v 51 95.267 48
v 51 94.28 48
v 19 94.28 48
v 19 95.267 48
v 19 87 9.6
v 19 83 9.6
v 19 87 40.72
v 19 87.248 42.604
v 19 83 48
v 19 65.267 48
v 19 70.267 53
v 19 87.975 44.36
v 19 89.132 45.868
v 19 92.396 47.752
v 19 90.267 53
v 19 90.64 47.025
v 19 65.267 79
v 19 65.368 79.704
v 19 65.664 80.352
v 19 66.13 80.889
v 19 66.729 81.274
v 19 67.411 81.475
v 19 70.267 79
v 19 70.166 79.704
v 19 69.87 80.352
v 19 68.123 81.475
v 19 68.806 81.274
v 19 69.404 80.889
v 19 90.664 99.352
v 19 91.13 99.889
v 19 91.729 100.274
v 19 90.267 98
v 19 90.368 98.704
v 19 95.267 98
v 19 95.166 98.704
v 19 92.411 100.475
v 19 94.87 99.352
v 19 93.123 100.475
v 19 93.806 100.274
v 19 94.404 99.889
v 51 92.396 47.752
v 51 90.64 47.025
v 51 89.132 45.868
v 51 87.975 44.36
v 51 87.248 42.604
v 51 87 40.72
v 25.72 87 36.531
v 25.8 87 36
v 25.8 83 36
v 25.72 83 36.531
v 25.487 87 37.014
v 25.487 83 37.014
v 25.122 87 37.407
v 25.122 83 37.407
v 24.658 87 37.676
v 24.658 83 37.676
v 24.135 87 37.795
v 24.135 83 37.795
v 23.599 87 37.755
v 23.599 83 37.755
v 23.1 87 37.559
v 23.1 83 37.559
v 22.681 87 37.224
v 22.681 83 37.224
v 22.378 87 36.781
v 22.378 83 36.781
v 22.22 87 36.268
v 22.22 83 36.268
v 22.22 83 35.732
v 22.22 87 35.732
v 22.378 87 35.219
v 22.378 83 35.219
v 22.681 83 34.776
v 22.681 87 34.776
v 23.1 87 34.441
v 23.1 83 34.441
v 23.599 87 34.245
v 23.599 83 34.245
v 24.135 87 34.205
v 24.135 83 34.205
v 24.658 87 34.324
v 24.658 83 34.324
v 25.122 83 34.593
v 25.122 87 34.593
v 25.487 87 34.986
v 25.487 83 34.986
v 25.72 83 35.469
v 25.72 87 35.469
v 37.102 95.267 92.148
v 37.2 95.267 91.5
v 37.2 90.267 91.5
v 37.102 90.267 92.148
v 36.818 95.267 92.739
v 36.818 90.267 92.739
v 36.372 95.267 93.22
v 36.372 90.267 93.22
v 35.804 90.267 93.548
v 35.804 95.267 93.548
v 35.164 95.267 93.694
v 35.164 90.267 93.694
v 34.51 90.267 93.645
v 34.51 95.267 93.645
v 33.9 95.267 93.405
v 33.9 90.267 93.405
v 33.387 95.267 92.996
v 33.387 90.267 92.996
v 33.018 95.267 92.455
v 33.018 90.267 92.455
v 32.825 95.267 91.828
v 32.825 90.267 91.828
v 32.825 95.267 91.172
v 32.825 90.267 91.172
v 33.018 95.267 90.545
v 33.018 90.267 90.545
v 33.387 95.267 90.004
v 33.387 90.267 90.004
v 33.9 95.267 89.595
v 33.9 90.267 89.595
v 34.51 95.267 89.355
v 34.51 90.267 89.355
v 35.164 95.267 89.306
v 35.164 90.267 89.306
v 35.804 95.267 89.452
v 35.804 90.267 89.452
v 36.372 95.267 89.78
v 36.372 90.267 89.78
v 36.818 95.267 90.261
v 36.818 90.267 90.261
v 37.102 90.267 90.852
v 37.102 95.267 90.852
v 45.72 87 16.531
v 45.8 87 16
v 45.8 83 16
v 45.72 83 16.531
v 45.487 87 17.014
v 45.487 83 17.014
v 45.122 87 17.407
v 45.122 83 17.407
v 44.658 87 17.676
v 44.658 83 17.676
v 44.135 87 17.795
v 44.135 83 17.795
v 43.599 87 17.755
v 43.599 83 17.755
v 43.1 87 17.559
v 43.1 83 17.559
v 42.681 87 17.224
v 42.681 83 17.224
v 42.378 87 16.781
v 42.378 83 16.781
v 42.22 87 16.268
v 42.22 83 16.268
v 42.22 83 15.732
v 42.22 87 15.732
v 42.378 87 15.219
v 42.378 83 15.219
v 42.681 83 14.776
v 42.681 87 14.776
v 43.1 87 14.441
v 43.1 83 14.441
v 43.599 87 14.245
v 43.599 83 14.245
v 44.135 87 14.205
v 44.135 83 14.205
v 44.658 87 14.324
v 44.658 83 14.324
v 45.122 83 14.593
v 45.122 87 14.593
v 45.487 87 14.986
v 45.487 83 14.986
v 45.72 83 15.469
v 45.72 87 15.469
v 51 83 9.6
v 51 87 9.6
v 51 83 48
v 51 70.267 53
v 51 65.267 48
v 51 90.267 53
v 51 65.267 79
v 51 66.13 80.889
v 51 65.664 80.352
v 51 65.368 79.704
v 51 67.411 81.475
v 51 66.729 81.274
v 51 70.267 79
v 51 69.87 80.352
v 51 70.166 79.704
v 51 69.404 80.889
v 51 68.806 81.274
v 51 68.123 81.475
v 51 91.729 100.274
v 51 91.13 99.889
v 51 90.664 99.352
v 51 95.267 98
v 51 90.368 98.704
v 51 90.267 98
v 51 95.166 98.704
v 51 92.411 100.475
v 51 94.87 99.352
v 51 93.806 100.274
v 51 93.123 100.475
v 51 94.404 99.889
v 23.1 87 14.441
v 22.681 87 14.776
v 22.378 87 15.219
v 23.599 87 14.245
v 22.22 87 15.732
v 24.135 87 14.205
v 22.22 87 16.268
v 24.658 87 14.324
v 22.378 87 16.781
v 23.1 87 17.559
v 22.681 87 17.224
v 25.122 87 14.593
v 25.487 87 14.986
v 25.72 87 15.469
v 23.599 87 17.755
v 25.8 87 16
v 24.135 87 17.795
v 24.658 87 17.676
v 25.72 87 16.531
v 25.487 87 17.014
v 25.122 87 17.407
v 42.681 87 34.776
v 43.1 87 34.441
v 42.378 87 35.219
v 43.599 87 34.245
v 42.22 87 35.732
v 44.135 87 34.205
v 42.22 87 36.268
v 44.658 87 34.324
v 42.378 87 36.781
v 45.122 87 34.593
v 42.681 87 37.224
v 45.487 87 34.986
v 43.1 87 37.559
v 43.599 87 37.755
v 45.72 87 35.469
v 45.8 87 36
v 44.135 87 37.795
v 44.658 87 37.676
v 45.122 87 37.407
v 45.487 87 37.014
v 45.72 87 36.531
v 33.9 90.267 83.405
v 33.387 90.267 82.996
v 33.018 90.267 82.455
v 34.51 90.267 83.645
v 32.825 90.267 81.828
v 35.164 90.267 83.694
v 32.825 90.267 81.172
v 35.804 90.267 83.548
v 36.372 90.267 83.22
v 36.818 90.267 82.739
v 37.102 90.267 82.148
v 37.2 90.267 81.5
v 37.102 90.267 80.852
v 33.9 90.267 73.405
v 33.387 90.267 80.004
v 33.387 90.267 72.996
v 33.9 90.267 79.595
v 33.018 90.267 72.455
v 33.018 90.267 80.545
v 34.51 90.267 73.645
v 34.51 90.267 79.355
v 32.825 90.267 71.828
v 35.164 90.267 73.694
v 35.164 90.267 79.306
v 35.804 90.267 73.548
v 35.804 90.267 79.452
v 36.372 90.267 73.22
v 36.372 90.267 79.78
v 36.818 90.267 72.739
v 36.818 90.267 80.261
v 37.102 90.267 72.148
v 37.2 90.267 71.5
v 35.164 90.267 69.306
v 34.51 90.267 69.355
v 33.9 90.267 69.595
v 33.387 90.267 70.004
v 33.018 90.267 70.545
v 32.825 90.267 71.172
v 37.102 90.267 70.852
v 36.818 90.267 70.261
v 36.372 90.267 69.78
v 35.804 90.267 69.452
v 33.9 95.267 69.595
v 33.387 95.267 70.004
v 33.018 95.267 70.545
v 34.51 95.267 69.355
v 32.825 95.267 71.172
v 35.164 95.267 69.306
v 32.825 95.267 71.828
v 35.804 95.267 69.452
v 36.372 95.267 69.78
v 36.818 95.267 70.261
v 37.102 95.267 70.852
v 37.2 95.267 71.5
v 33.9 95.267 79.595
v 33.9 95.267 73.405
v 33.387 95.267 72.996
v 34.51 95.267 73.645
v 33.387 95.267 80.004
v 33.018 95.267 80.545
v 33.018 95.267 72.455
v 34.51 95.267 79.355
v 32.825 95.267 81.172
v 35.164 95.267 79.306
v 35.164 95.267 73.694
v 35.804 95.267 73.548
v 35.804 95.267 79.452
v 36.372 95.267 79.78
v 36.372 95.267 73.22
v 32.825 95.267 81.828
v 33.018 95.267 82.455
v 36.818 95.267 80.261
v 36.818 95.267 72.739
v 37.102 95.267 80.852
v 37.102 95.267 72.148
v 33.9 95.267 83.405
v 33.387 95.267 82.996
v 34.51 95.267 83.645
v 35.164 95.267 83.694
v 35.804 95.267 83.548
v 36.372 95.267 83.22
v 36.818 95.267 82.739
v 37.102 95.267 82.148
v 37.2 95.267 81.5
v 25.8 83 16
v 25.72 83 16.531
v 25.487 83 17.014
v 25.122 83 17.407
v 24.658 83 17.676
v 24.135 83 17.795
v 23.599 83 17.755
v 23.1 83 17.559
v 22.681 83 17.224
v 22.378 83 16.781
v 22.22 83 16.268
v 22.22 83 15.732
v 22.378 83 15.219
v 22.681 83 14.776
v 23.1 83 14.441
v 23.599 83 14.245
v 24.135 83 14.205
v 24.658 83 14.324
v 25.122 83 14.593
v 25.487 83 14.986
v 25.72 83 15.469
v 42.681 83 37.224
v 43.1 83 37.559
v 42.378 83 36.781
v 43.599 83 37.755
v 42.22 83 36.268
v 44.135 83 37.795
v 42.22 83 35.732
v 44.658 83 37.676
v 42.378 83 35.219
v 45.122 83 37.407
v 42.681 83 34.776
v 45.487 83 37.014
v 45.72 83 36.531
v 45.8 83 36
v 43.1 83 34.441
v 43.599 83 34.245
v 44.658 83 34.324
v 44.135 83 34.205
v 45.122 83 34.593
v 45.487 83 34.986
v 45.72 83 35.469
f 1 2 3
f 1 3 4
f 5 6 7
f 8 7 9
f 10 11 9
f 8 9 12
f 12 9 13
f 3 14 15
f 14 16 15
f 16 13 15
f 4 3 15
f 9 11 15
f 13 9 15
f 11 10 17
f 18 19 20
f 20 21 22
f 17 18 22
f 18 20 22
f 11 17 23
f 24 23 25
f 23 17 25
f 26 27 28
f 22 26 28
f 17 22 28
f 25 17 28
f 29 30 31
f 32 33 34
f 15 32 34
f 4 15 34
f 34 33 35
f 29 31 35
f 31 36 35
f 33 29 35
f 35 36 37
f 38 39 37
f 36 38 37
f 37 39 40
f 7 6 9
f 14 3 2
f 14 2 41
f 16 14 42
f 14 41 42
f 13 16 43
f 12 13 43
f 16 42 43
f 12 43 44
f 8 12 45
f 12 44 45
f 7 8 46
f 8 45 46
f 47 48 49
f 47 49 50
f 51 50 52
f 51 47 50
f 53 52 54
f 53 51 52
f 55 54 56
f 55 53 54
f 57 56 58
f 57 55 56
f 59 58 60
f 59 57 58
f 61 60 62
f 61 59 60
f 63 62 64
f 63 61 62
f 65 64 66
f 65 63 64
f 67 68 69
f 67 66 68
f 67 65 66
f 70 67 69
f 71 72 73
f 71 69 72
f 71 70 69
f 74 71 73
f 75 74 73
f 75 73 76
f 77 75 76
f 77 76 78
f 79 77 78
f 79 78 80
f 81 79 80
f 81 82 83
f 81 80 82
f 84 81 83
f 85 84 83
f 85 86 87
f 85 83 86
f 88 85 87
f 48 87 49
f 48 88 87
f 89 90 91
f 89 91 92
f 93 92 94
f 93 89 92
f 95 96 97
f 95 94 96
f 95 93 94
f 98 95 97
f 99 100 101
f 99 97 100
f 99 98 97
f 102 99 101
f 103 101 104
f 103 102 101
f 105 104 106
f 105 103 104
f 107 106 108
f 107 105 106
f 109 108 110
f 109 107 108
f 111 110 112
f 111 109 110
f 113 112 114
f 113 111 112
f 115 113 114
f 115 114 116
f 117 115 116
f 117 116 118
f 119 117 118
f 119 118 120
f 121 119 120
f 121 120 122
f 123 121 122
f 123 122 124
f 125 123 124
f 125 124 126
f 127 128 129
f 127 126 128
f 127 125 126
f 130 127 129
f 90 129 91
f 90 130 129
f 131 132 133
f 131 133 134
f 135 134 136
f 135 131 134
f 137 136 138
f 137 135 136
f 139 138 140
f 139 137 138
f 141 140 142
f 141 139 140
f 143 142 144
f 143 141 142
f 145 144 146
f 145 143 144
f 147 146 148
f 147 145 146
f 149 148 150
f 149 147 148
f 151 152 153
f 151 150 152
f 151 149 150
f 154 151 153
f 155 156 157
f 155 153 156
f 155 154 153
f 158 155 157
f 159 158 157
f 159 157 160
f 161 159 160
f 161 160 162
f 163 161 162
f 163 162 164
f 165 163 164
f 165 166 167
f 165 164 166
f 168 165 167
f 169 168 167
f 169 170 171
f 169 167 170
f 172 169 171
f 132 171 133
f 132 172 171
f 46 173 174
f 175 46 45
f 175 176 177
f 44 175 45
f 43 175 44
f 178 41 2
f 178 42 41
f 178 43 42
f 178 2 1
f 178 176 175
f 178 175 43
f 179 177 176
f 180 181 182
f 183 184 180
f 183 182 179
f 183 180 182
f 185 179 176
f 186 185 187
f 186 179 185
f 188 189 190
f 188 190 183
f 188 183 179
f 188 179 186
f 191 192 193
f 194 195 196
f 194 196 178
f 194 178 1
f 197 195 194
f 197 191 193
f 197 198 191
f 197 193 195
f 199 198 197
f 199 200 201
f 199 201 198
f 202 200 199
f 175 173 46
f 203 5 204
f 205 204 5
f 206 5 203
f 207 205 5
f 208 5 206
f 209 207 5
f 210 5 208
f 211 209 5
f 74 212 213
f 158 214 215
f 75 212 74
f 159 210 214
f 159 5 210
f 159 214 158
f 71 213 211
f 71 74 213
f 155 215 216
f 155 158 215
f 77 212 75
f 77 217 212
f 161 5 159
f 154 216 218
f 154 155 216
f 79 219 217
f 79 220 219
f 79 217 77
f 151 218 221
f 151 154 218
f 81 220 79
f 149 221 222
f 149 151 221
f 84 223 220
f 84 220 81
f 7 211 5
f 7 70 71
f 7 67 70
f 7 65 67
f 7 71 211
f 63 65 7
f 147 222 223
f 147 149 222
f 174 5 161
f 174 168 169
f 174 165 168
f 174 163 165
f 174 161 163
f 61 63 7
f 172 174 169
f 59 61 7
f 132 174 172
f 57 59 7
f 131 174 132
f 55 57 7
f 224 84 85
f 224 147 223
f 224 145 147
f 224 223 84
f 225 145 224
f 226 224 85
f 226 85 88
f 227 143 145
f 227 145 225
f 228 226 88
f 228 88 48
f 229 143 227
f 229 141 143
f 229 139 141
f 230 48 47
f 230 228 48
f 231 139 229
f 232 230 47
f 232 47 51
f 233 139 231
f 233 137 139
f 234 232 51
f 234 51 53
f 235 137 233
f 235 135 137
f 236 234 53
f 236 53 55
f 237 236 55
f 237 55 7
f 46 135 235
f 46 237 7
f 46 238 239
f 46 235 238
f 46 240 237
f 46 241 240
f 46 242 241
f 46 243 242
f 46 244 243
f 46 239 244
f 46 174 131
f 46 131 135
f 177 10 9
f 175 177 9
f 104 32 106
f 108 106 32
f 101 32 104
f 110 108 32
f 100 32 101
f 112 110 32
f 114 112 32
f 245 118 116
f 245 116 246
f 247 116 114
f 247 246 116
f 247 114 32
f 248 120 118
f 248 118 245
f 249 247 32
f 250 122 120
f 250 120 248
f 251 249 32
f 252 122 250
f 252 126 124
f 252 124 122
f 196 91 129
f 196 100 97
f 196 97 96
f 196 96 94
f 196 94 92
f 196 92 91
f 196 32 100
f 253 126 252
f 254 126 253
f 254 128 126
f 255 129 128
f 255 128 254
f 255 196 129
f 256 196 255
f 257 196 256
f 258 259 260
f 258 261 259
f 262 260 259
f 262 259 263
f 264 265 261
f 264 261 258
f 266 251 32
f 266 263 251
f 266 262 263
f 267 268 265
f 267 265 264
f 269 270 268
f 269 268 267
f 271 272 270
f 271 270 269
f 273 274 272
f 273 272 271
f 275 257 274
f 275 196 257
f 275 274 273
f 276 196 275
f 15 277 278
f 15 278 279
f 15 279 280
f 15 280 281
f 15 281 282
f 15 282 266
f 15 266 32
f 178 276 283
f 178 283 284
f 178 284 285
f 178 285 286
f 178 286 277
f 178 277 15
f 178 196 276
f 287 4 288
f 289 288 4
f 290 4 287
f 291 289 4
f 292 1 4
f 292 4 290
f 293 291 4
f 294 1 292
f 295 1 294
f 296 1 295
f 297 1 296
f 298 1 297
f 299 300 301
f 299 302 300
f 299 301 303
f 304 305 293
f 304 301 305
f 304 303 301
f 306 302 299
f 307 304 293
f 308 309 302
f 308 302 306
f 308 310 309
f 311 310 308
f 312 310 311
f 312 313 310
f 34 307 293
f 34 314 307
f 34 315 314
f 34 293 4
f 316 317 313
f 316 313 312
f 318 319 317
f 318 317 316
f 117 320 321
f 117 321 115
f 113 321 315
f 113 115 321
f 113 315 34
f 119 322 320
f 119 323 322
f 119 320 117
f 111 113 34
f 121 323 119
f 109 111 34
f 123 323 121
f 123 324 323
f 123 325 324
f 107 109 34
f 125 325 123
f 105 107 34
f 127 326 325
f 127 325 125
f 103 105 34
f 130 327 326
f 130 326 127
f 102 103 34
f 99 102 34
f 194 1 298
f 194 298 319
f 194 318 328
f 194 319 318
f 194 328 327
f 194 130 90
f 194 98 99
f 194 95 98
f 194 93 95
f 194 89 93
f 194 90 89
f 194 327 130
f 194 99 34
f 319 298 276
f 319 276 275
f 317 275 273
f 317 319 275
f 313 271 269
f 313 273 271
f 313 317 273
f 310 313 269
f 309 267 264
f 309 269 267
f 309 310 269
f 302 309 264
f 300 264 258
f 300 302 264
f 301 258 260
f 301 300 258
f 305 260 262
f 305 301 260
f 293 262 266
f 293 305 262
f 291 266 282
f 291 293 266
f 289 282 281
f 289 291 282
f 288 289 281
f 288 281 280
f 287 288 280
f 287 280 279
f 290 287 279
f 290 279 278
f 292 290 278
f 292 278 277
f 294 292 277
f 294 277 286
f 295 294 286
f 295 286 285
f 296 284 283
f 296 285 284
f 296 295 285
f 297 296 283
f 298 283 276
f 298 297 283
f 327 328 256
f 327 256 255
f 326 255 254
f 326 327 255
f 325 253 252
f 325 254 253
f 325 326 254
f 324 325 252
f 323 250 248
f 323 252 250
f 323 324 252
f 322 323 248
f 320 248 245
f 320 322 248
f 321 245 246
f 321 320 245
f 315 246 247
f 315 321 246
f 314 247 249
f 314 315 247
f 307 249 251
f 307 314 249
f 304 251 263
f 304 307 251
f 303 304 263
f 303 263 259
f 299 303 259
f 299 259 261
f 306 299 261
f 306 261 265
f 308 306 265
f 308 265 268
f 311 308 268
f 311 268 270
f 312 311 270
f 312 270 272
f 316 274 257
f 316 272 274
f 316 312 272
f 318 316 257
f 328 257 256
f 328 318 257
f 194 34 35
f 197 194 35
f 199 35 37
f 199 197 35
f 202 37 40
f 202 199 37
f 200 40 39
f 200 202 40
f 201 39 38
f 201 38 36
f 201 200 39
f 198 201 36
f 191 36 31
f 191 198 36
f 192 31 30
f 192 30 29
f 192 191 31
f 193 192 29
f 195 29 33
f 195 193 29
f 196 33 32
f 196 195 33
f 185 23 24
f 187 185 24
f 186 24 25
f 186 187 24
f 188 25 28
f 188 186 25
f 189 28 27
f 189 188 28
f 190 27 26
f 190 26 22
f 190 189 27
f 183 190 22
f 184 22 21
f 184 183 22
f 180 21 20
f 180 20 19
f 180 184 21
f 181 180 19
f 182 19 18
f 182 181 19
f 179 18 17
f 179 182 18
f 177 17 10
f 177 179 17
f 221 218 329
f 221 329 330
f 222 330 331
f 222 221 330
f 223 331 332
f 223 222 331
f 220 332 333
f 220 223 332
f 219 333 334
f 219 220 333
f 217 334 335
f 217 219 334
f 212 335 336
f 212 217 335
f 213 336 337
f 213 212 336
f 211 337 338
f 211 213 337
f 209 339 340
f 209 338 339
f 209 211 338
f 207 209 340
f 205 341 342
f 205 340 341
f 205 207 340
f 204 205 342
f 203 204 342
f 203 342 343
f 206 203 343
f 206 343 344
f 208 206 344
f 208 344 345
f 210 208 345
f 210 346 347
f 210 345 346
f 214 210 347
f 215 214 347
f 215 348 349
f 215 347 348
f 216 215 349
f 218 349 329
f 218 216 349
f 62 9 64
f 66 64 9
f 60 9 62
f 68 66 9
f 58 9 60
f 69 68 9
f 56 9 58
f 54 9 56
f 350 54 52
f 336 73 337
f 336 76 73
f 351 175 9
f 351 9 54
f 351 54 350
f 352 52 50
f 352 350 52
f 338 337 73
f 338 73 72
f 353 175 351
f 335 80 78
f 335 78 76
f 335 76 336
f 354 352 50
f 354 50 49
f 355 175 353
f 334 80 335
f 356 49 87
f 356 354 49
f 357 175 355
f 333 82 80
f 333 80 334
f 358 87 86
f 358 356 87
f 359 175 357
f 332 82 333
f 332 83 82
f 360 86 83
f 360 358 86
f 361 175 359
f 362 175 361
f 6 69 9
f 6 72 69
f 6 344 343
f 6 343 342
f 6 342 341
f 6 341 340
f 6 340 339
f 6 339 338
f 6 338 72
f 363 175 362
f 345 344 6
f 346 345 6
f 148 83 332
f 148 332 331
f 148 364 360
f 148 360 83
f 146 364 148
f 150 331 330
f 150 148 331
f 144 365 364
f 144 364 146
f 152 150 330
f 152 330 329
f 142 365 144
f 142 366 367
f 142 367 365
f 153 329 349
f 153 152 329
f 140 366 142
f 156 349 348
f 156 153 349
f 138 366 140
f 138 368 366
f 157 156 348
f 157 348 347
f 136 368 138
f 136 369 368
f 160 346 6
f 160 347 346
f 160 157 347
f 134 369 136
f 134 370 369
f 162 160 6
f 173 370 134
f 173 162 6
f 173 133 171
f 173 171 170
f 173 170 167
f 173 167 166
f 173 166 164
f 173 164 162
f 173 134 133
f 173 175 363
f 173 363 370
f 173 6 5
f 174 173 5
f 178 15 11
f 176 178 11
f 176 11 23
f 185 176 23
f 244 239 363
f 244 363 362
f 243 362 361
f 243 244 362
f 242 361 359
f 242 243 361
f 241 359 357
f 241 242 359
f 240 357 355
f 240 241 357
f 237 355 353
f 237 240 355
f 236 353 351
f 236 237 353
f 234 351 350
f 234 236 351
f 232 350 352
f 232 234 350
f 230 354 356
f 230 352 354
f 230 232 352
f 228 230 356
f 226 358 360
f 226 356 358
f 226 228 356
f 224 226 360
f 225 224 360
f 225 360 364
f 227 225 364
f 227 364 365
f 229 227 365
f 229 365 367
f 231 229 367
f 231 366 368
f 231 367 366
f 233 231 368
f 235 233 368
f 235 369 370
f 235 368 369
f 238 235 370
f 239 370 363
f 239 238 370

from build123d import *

# Parameters (mm, degrees)
CYLINDER009_R            = 2.2
CYLINDER009_DEPTH        = 20
ARRAY006_Z_COUNT         = 3
ARRAY006_Z_PITCH         = 10
CYLINDER008_R            = 1.8
CYLINDER008_DEPTH        = 10
ARRAY005_X_COUNT         = 2
ARRAY005_X_PITCH         = 20
ARRAY005_Y_COUNT         = 2
ARRAY005_Y_PITCH         = 20
ARRAY005_PLACEMENT_ANGLE = 90
PAD002_DEPTH             = 16


with BuildPart() as holder_insert_hole_array:
    # Cylinder009 → Cylinder009 (new body)
    with BuildSketch(Plane.XZ):
        Circle(CYLINDER009_R)
    extrude(amount=CYLINDER009_DEPTH)

    # Array006 Z: holder insert hole array ×3


with BuildPart() as holder_insert_hole_array_1:
    add(holder_insert_hole_array.part)
    with Locations(*[(0, 0, i * ARRAY006_Z_PITCH) for i in range(1, ARRAY006_Z_COUNT)]):
        add(holder_insert_hole_array.part)


with BuildPart() as holder_insert_hole_array_2:
    # Array006 placement: moved
    add(holder_insert_hole_array_1.part.moved(Location((35, 103, 71.5))))


with BuildPart() as holder_hole_fusion:
    # Cylinder008 → Cylinder008 (new body)
    with BuildSketch(Plane.XY):
        Circle(CYLINDER008_R)
    extrude(amount=CYLINDER008_DEPTH)

    # Array005 X: holder hole fusion ×2


with BuildPart() as holder_hole_fusion_1:
    add(holder_hole_fusion.part)
    with Locations(*[(i * ARRAY005_X_PITCH, 0, 0) for i in range(1, ARRAY005_X_COUNT)]):
        add(holder_hole_fusion.part)

    # Array005 Y: holder hole fusion ×2


with BuildPart() as holder_hole_fusion_2:
    add(holder_hole_fusion_1.part)
    with Locations(*[(0, i * ARRAY005_Y_PITCH, 0) for i in range(1, ARRAY005_Y_COUNT)]):
        add(holder_hole_fusion_1.part)


with BuildPart() as holder_hole_fusion_3:
    # Array005 placement: moved
    add(holder_hole_fusion_2.part.moved(Location((24, 88, 16))).rotate(Axis((24, 88, 16), (1, 0, 0)), ARRAY005_PLACEMENT_ANGLE))

    # Fusion008: union holder insert hole array
    add(holder_insert_hole_array_2.part)


with BuildPart() as holder_cut:
    # Sketch002 → Pad002 (new body, symmetric)
    with BuildSketch(Plane.YZ):
        with BuildLine():
            Line((65.267053, 48), (83, 48))
            Line((83, 48), (83, 9.6))
            Line((83, 9.6), (87, 9.6))
            Line((87, 9.6), (87, 40.719632))
            ThreePointArc((94.280368, 48), (89.13237, 45.86763), (87, 40.719632))
            Line((94.280368, 48), (95.267053, 48))
            Line((95.267053, 48), (95.267053, 98))
            ThreePointArc((95.267053, 98), (92.767053, 100.5), (90.267053, 98))
            Line((90.267053, 98), (90.267053, 53))
            Line((90.267053, 53), (70.267053, 53))
            Line((70.267053, 53), (70.267053, 79))
            ThreePointArc((70.267053, 79), (67.767053, 81.5), (65.267053, 79))
            Line((65.267053, 79), (65.267053, 48))
        make_face()
    extrude(amount=PAD002_DEPTH, both=True)


with BuildPart() as holder_cut_1:
    # Body002 placement: moved
    add(holder_cut.part.moved(Location((35, 0, 0))))

    # Cut001006: cut holder hole fusion
    add(holder_hole_fusion_3.part, mode=Mode.SUBTRACT)


solid = holder_cut_1.part
